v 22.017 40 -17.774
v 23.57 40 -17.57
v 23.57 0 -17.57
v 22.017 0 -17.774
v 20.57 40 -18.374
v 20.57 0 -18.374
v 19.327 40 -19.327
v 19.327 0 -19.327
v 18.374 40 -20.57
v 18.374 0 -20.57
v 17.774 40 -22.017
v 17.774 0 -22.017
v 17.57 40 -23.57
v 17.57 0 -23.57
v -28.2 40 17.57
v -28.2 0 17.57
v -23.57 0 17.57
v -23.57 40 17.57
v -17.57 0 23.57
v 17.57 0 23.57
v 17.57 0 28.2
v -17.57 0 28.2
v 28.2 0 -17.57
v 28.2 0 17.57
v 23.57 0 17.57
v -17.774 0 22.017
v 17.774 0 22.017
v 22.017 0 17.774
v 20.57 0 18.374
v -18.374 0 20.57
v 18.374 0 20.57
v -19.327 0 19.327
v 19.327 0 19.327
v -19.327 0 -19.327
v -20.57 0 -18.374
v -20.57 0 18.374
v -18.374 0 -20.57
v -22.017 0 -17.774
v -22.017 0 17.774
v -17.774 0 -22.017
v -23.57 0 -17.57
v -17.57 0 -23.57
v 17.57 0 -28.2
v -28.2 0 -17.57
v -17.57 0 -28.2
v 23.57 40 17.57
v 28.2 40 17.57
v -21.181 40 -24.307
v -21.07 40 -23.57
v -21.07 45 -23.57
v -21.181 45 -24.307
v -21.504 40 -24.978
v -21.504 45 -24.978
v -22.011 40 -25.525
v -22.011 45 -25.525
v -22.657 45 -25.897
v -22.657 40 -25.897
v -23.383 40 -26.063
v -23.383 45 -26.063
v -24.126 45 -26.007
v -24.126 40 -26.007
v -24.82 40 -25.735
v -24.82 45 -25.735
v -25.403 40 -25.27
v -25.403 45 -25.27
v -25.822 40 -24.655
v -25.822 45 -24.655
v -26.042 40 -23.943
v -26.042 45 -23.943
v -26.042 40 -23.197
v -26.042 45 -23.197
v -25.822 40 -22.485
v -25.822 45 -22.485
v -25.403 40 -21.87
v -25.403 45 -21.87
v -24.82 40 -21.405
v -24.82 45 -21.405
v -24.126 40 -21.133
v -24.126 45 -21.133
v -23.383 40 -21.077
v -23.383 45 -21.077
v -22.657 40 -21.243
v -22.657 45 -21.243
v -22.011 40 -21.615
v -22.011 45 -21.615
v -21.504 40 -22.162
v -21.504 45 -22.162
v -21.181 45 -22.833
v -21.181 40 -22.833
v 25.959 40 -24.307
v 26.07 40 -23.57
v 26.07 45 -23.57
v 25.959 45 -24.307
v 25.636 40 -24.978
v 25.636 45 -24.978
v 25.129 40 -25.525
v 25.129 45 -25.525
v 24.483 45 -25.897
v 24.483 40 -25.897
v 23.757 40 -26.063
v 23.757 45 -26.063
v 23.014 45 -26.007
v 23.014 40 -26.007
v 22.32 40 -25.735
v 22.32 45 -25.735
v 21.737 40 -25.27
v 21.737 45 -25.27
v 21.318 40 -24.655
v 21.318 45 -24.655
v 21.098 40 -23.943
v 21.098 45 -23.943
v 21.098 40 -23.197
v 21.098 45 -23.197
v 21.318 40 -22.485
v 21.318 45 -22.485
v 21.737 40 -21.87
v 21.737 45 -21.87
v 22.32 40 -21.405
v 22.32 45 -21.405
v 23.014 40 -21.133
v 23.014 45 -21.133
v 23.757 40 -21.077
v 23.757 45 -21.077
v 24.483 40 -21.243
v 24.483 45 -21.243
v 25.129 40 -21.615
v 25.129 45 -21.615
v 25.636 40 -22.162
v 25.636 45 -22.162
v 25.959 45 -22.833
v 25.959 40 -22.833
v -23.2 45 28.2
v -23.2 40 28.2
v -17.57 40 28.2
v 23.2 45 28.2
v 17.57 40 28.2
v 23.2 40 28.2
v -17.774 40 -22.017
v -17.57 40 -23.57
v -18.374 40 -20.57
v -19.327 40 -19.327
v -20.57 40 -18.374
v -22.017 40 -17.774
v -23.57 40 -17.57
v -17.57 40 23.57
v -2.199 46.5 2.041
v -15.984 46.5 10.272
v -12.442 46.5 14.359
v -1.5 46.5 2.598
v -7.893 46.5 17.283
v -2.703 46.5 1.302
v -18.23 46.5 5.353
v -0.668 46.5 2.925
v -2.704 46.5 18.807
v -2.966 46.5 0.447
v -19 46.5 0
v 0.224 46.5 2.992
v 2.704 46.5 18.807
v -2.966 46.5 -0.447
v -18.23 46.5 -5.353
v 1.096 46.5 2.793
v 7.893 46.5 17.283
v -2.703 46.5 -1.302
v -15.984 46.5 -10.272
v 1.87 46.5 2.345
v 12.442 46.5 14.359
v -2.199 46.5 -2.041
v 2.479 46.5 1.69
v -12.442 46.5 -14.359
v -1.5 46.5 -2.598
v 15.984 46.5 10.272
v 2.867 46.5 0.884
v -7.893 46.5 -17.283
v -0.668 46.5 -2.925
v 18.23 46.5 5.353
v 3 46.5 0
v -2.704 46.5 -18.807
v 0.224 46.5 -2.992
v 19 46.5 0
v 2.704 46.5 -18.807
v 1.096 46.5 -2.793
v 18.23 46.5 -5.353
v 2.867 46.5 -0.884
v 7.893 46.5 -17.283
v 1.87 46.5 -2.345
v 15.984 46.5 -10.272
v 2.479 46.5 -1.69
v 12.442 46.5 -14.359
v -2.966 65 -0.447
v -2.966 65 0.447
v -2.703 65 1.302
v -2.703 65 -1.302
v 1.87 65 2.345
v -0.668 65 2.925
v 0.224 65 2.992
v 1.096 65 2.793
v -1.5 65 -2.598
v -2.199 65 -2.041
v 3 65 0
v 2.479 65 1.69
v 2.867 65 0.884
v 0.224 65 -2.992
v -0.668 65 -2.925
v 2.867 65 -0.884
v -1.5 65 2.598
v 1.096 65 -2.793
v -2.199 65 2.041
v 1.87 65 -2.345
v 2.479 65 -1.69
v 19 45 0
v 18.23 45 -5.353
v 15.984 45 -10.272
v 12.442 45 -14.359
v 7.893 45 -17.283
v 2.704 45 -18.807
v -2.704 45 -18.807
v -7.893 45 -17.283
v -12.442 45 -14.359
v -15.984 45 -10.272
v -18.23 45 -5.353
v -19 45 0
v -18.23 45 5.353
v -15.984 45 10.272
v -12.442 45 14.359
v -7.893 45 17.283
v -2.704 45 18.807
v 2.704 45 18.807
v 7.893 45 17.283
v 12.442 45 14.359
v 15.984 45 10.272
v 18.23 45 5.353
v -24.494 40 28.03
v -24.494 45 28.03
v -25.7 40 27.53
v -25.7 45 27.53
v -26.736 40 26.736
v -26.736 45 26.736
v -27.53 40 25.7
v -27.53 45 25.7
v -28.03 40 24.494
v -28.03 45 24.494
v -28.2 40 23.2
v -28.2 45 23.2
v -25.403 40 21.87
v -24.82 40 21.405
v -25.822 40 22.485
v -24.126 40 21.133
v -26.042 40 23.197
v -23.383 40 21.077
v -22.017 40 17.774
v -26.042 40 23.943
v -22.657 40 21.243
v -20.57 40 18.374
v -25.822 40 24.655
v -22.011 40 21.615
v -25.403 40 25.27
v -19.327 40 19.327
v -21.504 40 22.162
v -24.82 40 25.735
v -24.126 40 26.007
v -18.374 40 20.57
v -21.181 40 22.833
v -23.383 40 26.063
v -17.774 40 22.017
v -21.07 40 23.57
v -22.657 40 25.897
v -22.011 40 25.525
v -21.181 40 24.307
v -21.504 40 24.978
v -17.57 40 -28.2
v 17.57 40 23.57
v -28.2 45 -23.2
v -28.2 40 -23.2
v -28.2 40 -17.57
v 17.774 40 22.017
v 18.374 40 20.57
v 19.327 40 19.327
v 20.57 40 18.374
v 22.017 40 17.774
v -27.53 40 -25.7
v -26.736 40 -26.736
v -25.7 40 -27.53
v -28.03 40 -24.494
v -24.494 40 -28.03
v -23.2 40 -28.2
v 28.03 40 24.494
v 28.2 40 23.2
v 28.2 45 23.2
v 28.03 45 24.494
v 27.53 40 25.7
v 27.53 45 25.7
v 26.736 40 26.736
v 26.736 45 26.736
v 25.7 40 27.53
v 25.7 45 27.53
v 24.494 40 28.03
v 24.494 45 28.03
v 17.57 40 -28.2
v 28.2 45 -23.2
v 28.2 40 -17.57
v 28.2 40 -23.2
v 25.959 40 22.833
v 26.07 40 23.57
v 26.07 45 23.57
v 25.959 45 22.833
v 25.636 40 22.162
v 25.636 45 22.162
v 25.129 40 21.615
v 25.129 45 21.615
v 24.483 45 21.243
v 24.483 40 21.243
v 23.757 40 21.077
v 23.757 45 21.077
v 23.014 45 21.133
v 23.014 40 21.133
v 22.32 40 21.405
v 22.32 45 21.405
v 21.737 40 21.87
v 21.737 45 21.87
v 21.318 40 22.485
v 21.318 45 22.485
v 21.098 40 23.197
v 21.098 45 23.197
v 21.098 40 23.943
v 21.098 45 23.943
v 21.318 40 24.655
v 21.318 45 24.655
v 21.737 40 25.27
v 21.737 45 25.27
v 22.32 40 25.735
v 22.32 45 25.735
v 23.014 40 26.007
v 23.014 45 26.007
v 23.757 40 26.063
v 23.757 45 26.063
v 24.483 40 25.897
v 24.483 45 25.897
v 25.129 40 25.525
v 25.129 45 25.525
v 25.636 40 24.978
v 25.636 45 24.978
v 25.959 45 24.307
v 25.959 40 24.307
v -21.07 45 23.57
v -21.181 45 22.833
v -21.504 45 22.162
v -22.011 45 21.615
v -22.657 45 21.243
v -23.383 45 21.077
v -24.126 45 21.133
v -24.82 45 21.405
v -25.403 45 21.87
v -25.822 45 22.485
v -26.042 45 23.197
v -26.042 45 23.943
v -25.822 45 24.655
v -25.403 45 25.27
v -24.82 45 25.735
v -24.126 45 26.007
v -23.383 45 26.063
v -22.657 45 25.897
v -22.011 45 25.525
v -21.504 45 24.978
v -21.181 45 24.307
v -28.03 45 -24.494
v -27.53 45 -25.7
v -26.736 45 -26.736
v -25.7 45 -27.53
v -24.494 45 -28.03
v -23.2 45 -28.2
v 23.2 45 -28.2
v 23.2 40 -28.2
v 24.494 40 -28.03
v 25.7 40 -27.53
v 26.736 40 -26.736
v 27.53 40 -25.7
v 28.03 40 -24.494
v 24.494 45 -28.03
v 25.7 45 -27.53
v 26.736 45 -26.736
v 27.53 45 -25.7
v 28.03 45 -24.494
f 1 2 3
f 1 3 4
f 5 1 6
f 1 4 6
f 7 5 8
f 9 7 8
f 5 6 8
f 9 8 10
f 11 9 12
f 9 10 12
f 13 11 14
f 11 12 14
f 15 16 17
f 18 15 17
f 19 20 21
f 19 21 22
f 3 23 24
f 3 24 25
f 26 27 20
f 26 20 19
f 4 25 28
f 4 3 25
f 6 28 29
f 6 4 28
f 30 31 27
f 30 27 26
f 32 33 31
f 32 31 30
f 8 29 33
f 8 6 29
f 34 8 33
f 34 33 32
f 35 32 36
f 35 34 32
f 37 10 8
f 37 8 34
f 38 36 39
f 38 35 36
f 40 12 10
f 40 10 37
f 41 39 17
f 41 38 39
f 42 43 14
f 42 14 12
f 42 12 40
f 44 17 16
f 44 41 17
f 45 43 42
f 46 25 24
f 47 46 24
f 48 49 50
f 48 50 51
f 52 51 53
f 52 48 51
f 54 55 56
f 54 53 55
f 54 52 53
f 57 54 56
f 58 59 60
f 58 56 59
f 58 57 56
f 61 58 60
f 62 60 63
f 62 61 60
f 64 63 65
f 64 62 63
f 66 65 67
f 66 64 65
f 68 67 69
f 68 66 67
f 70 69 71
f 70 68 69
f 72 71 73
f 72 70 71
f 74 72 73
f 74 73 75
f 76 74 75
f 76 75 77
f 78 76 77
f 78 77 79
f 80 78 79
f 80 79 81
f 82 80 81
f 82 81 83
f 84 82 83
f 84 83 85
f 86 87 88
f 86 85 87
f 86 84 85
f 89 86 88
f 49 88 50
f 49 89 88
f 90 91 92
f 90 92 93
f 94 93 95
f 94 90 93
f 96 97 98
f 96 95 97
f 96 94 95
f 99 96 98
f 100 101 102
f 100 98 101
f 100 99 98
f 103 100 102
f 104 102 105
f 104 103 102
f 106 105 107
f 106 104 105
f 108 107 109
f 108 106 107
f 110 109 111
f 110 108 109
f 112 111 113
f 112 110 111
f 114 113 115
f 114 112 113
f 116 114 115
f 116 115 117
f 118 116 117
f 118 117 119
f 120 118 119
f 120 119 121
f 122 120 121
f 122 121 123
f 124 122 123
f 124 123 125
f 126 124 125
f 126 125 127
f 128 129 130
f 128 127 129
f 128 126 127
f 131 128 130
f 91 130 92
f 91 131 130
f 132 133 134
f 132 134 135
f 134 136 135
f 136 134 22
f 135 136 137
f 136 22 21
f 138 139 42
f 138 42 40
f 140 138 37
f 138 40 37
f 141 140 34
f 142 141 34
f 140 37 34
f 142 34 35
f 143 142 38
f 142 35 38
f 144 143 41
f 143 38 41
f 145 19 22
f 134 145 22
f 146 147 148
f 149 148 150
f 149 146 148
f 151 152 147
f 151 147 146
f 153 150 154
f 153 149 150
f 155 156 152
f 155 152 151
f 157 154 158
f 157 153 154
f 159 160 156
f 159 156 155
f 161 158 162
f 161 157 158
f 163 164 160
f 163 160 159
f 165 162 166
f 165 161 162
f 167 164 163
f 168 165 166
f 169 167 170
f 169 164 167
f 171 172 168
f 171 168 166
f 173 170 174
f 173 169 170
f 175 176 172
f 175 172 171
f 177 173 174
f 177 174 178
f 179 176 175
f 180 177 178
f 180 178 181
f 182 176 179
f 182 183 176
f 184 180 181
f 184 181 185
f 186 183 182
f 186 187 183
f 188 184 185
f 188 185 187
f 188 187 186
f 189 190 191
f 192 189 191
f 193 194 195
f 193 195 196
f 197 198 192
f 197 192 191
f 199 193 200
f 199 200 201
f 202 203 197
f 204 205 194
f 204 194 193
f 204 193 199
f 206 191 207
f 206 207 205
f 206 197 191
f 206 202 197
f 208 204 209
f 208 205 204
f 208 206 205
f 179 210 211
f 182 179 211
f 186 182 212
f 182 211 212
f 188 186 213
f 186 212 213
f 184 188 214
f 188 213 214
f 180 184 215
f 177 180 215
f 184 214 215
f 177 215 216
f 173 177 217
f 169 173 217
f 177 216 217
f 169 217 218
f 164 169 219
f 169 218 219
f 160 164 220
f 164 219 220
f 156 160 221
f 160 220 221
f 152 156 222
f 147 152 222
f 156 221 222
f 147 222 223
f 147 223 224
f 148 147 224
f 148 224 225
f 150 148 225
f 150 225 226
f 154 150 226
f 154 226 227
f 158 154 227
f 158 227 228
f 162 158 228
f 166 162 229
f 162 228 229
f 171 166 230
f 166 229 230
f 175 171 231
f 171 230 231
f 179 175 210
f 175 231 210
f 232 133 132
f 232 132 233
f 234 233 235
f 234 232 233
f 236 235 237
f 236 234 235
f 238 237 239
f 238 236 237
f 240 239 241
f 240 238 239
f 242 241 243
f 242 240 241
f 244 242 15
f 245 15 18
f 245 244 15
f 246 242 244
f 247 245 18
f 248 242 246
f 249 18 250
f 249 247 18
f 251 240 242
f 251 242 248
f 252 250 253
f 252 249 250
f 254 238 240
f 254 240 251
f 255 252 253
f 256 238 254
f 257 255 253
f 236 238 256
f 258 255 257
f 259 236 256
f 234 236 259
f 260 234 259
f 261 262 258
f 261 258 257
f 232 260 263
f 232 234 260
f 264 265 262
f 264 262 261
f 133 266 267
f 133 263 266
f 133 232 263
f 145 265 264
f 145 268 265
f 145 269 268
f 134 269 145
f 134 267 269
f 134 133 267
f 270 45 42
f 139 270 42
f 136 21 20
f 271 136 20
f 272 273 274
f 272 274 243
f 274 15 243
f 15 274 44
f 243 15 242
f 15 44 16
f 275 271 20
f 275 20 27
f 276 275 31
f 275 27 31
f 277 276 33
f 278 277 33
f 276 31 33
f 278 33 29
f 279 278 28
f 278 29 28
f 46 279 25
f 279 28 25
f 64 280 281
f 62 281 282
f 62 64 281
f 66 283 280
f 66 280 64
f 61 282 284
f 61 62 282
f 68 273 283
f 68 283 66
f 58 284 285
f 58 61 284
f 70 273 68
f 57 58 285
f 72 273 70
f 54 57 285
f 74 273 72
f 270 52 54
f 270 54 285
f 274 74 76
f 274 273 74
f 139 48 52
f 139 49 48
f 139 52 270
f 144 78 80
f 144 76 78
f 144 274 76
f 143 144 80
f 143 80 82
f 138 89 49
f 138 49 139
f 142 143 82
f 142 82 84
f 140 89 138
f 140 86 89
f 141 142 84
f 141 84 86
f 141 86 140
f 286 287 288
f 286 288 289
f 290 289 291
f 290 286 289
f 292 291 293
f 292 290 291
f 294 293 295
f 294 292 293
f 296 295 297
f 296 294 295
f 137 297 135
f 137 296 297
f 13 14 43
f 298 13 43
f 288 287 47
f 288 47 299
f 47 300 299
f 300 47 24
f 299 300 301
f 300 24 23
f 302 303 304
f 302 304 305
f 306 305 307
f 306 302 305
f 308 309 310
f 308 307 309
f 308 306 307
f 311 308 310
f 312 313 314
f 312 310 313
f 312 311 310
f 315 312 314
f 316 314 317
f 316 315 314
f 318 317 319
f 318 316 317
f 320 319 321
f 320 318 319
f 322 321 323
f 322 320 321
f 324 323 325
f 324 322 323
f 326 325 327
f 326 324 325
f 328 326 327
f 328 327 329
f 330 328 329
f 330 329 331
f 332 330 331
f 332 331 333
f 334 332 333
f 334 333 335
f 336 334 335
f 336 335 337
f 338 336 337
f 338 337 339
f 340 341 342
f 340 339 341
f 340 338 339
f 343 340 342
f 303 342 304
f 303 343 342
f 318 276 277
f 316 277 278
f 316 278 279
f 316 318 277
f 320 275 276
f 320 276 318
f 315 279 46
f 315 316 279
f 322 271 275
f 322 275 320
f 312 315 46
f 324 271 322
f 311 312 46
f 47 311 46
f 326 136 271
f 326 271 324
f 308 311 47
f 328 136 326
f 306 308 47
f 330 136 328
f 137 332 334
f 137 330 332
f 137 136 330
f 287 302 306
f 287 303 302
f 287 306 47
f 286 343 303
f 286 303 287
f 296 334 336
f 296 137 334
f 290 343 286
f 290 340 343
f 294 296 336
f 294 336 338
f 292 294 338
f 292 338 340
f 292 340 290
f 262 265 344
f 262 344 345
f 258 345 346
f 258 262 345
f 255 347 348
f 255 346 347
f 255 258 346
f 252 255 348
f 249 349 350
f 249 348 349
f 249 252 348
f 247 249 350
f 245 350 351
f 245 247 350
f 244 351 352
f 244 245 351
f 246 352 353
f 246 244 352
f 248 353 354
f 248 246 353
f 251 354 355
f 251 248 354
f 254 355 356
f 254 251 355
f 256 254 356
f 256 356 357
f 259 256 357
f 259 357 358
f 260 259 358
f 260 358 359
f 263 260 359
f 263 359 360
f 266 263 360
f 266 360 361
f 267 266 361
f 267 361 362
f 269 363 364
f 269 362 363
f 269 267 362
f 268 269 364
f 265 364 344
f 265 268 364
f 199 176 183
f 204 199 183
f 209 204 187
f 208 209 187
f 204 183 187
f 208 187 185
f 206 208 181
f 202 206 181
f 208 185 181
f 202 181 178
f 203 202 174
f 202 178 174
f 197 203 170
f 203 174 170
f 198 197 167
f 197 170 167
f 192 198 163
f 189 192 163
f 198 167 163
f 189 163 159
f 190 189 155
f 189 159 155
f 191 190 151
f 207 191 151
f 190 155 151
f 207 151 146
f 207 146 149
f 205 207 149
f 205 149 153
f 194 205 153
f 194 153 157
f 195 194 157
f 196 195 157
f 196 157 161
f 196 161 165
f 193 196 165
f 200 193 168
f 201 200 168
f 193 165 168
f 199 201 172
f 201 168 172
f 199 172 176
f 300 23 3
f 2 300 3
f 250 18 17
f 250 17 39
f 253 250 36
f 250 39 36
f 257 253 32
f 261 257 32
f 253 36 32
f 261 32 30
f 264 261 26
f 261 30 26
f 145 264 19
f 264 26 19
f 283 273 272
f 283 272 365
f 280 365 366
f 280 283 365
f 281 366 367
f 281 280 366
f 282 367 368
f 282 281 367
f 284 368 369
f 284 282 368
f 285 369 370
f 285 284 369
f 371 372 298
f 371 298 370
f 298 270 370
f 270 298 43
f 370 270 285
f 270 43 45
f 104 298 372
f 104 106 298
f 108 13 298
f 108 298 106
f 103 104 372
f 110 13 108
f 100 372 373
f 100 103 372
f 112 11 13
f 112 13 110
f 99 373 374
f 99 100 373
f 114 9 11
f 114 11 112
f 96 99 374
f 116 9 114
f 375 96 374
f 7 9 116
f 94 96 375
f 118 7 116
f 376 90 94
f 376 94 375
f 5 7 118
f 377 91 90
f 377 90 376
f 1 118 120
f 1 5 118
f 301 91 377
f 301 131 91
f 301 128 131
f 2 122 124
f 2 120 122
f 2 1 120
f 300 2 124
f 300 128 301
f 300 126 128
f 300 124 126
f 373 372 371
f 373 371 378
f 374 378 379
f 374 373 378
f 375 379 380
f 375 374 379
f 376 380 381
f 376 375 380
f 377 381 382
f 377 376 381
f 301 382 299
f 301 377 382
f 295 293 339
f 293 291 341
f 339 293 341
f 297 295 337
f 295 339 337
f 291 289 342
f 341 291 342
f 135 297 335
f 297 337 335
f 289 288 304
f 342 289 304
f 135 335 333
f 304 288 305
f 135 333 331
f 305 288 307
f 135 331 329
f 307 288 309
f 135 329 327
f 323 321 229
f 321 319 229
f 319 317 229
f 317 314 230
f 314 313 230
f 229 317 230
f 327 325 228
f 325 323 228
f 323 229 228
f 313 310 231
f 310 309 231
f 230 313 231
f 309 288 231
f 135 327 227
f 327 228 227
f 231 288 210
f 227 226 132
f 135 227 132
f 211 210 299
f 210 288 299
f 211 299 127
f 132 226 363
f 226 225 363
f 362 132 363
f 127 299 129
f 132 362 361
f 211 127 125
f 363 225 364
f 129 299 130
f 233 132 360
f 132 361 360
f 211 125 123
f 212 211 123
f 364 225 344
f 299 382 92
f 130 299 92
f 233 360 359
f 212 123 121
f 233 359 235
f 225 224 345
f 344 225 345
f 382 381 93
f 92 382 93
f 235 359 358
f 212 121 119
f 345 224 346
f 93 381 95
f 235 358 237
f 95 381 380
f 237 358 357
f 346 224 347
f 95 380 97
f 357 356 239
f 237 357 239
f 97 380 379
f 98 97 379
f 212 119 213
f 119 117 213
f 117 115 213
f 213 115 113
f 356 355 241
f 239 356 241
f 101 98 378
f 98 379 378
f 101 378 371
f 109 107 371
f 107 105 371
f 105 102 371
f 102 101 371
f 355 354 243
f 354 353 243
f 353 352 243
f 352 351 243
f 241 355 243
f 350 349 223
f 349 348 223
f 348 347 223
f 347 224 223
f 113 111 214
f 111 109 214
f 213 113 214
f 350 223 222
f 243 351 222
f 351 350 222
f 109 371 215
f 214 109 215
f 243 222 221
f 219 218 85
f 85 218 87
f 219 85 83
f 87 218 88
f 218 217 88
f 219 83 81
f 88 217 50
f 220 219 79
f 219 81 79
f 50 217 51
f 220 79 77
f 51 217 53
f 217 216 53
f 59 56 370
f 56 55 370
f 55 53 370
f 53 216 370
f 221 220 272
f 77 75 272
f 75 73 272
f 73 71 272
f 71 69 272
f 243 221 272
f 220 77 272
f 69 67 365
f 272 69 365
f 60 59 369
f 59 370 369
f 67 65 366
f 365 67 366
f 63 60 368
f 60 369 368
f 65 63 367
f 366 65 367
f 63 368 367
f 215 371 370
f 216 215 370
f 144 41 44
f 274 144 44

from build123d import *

# Parameters (mm, degrees)
BOSS_EXTRUDE1_DEPTH     = 45
SKETCH3_OUTSIDE_W       = 76.716
SKETCH3_OUTSIDE_H       = 76.716
CUT_EXTRUDE1_DEPTH      = 40
SKETCH4_R               = 2.5
CUT_EXTRUDE3_DEPTH      = 46
CUT_EXTRUDE3_DEPTH_BACK = 1
SKETCH5_R               = 19
BOSS_EXTRUDE2_DEPTH     = 1.5
SKETCH6_R               = 3
BOSS_EXTRUDE3_DEPTH     = 18.5


with BuildPart() as part:
    # Sketch2 → Boss-Extrude1 (new body)
    with BuildSketch(Plane(origin=(0, 0, 0), x_dir=(1, 0, 0), z_dir=(0, 1, 0))):
        with BuildLine():
            Line((-28.2, -23.2), (-28.2, 23.2))
            ThreePointArc((-28.2, 23.2), (-26.735533906, 26.735533906), (-23.2, 28.2))
            Line((-23.2, 28.2), (23.2, 28.2))
            ThreePointArc((23.2, 28.2), (26.735533906, 26.735533906), (28.2, 23.2))
            Line((28.2, 23.2), (28.2, -23.2))
            ThreePointArc((28.2, -23.2), (26.735533906, -26.735533906), (23.2, -28.2))
            Line((23.2, -28.2), (-23.2, -28.2))
            ThreePointArc((-23.2, -28.2), (-26.735533906, -26.735533906), (-28.2, -23.2))
        make_face()
    extrude(amount=BOSS_EXTRUDE1_DEPTH)

    # Sketch3 outside → Cut-Extrude1 (cut)
    with BuildSketch(Plane.XZ):
        Rectangle(SKETCH3_OUTSIDE_W, SKETCH3_OUTSIDE_H)
        with BuildLine():
            Line((-28.2, 17.57), (-23.57, 17.57))
            ThreePointArc((-23.57, 17.57), (-19.327359313, 19.327359313), (-17.57, 23.57))
            Line((-17.57, 23.57), (-17.57, 28.2))
            Line((-17.57, 28.2), (17.57, 28.2))
            Line((17.57, 28.2), (17.57, 23.57))
            ThreePointArc((17.57, 23.57), (19.327359313, 19.327359313), (23.57, 17.57))
            Line((23.57, 17.57), (28.2, 17.57))
            Line((28.2, 17.57), (28.2, -17.57))
            Line((28.2, -17.57), (23.57, -17.57))
            ThreePointArc((23.57, -17.57), (19.327359313, -19.327359313), (17.57, -23.57))
            Line((17.57, -23.57), (17.57, -28.2))
            Line((17.57, -28.2), (-17.57, -28.2))
            Line((-17.57, -28.2), (-17.57, -23.57))
            ThreePointArc((-17.57, -23.57), (-19.327359313, -19.327359313), (-23.57, -17.57))
            Line((-23.57, -17.57), (-28.2, -17.57))
            Line((-28.2, -17.57), (-28.2, 17.57))
        make_face(mode=Mode.SUBTRACT)
    extrude(amount=-CUT_EXTRUDE1_DEPTH, mode=Mode.SUBTRACT)

    # Sketch4 → Cut-Extrude3 (cut, two sides)
    with BuildSketch(Plane(origin=(0, 0, 0), x_dir=(1, 0, 0), z_dir=(0, 1, 0))) as cut_extrude3_sk:
        with Locations((23.57, -23.57)):
            Circle(SKETCH4_R)
        with Locations((-23.57, -23.57)):
            Circle(SKETCH4_R)
        with Locations((23.57, 23.57)):
            Circle(SKETCH4_R)
        with Locations((-23.57, 23.57)):
            Circle(SKETCH4_R)
    extrude(amount=CUT_EXTRUDE3_DEPTH, mode=Mode.SUBTRACT)
    extrude(cut_extrude3_sk.sketch, amount=-CUT_EXTRUDE3_DEPTH_BACK, mode=Mode.SUBTRACT)

    # Sketch5 → Boss-Extrude2 (add)
    with BuildSketch(Plane(origin=(0, 45, 0), x_dir=(1, 0, 0), z_dir=(0, 1, 0))):
        Circle(SKETCH5_R)
    extrude(amount=BOSS_EXTRUDE2_DEPTH)

    # Sketch6 → Boss-Extrude3 (add)
    with BuildSketch(Plane(origin=(0, 46.5, 0), x_dir=(1, 0, 0), z_dir=(0, 1, 0))):
        Circle(SKETCH6_R)
    extrude(amount=BOSS_EXTRUDE3_DEPTH)


solid = part.part
